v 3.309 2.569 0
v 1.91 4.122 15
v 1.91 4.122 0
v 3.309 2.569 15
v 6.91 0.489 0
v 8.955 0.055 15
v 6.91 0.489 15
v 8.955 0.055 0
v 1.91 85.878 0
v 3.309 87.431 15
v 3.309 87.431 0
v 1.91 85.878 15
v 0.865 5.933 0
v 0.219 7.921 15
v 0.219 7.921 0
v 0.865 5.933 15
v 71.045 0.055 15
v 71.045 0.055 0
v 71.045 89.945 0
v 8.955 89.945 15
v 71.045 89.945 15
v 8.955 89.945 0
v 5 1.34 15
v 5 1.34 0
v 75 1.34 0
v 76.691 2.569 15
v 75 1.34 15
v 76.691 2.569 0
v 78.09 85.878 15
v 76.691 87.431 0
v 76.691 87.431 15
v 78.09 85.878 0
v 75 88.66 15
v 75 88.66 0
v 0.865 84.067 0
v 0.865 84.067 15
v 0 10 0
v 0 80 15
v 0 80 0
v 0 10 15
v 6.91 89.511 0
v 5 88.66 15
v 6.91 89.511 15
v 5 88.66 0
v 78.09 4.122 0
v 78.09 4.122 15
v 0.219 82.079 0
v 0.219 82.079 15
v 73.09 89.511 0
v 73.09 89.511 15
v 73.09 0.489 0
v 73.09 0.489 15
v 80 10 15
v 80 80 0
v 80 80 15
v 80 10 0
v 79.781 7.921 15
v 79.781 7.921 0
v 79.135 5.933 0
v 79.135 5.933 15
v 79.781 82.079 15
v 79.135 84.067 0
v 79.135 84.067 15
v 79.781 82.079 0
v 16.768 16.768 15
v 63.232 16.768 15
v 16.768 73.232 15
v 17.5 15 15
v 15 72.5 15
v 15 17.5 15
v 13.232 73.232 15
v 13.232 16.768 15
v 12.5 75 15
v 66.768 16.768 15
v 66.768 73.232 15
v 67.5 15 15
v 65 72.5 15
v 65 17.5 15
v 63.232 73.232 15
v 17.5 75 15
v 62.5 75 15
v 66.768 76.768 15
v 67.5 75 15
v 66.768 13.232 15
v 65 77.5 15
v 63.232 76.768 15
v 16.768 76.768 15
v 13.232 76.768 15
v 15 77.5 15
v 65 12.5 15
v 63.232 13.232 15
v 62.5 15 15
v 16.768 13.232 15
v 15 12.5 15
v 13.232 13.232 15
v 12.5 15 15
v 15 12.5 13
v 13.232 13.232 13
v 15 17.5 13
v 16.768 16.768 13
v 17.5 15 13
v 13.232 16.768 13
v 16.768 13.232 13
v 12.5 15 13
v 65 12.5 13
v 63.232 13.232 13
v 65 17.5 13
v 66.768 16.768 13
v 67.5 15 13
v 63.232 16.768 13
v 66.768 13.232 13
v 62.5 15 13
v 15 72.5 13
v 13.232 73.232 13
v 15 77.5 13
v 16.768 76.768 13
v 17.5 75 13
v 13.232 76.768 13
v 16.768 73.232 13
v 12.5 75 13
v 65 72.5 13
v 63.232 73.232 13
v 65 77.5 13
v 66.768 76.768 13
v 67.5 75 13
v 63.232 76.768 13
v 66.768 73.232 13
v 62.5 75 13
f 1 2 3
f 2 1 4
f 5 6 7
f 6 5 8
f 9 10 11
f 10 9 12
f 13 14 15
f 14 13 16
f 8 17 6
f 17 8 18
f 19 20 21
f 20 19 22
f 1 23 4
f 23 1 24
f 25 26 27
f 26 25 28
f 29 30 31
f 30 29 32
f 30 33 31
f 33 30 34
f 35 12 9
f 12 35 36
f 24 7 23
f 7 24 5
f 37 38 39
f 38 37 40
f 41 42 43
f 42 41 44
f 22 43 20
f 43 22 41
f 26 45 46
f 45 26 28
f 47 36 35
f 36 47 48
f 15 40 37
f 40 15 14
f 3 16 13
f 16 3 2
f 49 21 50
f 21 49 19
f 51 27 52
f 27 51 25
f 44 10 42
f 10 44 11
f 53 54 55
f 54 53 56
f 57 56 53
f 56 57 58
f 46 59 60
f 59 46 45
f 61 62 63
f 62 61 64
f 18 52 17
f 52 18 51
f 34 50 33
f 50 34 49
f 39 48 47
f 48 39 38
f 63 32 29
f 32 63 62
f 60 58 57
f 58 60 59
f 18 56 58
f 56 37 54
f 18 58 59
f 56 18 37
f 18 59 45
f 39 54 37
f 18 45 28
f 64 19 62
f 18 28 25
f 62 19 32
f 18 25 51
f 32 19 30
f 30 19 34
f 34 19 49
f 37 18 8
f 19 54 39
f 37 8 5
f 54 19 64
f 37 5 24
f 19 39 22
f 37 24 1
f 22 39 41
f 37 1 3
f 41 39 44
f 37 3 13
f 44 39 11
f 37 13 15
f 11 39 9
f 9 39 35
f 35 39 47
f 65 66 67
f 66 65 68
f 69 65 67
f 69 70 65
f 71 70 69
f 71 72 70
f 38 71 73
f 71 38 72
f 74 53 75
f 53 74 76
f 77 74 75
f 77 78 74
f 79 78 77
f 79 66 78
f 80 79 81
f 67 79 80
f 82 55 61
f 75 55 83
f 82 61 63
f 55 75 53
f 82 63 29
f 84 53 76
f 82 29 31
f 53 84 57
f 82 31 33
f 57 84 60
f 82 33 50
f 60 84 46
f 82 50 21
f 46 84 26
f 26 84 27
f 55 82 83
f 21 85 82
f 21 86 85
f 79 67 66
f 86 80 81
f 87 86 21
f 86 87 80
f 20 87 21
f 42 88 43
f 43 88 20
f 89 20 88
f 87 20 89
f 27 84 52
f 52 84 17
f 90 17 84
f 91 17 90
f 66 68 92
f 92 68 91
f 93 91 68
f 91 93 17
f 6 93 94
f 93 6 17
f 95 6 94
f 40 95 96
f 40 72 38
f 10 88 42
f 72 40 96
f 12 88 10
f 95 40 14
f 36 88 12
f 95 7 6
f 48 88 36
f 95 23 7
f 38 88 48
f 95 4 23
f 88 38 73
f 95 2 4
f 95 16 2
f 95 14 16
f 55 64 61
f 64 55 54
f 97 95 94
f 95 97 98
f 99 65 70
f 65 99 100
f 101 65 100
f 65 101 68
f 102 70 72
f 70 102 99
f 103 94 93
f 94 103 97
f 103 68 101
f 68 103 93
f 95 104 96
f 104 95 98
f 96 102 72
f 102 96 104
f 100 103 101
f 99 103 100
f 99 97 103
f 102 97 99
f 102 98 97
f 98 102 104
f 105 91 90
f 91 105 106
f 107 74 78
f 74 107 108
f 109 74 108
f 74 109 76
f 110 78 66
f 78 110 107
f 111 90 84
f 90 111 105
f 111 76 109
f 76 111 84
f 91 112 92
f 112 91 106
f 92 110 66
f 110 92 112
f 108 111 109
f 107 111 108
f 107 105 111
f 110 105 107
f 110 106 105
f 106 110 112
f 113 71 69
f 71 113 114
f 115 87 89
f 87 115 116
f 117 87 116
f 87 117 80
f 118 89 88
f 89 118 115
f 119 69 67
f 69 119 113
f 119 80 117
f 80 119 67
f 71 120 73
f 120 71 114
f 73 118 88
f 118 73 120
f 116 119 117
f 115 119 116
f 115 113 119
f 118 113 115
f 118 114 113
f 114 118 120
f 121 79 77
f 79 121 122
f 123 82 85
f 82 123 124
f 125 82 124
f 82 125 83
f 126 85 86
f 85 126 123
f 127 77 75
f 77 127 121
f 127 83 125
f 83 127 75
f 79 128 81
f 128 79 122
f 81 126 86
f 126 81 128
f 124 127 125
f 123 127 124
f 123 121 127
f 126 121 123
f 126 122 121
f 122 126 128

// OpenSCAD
// PERCY UNIT - Chest Plate with Lightning Bolt
// OpenSCAD file - export to STL for3D printing

// Parameters
chest_width = 80;
chest_height = 90;
chest_depth = 15;
bolt_width = 20;
bolt_height = 50;

// Main chest plate (rounded rectangle)
module rounded_chest(width, height, depth, radius) {
    hull() {
        translate([radius, radius, 0])
            cylinder(r=radius, h=depth);
        translate([width - radius, radius, 0])
            cylinder(r=radius, h=depth);
        translate([radius, height - radius, 0])
            cylinder(r=radius, h=depth);
        translate([width - radius, height - radius, 0])
            cylinder(r=radius, h=depth);
    }
}

difference() {
    // Base chest plate
    rounded_chest(chest_width, chest_height, chest_depth, 10);
    
    // Lightning bolt cutout (simplified 2D extrusion)
    translate([chest_width/2 - bolt_width/2, chest_height/2 - bolt_height/2, -1]) {
        linear_extrude(height=chest_depth + 2) {
            polygon(points=[
                [bolt_width*0.5, 0],
                [bolt_width*0.8, bolt_height*0.3],
                [bolt_width*0.5, bolt_height*0.3],
                [bolt_width*0.7, bolt_height*0.5],
                [bolt_width*0.4, bolt_height*0.5],
                [bolt_width*0.6, bolt_height*0.7],
                [bolt_width*0.3, bolt_height*1],
                [bolt_width*0.6, bolt_height*0.7],
                [bolt_width*0.5, bolt_height*1],
                [bolt_width*0.3, bolt_height*0.7],
                [0, bolt_height*0.7],
                [bolt_width*0.2, bolt_height*0.5],
                [bolt_width*0.5, bolt_height*0.5]
            ]);
        }
    }
    
    // LED mounting holes (4 corners)
    led_hole_dia = 5;
    led_spacing = 15;
    translate([led_spacing, led_spacing, chest_depth - 2]) cylinder(d=led_hole_dia, h=3);
    translate([chest_width - led_spacing, led_spacing, chest_depth - 2]) cylinder(d=led_hole_dia, h=3);
    translate([led_spacing, chest_height - led_spacing, chest_depth - 2]) cylinder(d=led_hole_dia, h=3);
    translate([chest_width - led_spacing, chest_height - led_spacing, chest_depth - 2]) cylinder(d=led_hole_dia, h=3);
}

// Mounting tabs (for screws)
mount_tab_width = 10;
mount_tab_height = 8;
translate([5, chest_height/2 - mount_tab_height/2, 0])
    cube([mount_tab_width, mount_tab_height, chest_depth]);
translate([chest_width - 5 - mount_tab_width, chest_height/2 - mount_tab_height/2, 0])
    cube([mount_tab_width, mount_tab_height, chest_depth]);
